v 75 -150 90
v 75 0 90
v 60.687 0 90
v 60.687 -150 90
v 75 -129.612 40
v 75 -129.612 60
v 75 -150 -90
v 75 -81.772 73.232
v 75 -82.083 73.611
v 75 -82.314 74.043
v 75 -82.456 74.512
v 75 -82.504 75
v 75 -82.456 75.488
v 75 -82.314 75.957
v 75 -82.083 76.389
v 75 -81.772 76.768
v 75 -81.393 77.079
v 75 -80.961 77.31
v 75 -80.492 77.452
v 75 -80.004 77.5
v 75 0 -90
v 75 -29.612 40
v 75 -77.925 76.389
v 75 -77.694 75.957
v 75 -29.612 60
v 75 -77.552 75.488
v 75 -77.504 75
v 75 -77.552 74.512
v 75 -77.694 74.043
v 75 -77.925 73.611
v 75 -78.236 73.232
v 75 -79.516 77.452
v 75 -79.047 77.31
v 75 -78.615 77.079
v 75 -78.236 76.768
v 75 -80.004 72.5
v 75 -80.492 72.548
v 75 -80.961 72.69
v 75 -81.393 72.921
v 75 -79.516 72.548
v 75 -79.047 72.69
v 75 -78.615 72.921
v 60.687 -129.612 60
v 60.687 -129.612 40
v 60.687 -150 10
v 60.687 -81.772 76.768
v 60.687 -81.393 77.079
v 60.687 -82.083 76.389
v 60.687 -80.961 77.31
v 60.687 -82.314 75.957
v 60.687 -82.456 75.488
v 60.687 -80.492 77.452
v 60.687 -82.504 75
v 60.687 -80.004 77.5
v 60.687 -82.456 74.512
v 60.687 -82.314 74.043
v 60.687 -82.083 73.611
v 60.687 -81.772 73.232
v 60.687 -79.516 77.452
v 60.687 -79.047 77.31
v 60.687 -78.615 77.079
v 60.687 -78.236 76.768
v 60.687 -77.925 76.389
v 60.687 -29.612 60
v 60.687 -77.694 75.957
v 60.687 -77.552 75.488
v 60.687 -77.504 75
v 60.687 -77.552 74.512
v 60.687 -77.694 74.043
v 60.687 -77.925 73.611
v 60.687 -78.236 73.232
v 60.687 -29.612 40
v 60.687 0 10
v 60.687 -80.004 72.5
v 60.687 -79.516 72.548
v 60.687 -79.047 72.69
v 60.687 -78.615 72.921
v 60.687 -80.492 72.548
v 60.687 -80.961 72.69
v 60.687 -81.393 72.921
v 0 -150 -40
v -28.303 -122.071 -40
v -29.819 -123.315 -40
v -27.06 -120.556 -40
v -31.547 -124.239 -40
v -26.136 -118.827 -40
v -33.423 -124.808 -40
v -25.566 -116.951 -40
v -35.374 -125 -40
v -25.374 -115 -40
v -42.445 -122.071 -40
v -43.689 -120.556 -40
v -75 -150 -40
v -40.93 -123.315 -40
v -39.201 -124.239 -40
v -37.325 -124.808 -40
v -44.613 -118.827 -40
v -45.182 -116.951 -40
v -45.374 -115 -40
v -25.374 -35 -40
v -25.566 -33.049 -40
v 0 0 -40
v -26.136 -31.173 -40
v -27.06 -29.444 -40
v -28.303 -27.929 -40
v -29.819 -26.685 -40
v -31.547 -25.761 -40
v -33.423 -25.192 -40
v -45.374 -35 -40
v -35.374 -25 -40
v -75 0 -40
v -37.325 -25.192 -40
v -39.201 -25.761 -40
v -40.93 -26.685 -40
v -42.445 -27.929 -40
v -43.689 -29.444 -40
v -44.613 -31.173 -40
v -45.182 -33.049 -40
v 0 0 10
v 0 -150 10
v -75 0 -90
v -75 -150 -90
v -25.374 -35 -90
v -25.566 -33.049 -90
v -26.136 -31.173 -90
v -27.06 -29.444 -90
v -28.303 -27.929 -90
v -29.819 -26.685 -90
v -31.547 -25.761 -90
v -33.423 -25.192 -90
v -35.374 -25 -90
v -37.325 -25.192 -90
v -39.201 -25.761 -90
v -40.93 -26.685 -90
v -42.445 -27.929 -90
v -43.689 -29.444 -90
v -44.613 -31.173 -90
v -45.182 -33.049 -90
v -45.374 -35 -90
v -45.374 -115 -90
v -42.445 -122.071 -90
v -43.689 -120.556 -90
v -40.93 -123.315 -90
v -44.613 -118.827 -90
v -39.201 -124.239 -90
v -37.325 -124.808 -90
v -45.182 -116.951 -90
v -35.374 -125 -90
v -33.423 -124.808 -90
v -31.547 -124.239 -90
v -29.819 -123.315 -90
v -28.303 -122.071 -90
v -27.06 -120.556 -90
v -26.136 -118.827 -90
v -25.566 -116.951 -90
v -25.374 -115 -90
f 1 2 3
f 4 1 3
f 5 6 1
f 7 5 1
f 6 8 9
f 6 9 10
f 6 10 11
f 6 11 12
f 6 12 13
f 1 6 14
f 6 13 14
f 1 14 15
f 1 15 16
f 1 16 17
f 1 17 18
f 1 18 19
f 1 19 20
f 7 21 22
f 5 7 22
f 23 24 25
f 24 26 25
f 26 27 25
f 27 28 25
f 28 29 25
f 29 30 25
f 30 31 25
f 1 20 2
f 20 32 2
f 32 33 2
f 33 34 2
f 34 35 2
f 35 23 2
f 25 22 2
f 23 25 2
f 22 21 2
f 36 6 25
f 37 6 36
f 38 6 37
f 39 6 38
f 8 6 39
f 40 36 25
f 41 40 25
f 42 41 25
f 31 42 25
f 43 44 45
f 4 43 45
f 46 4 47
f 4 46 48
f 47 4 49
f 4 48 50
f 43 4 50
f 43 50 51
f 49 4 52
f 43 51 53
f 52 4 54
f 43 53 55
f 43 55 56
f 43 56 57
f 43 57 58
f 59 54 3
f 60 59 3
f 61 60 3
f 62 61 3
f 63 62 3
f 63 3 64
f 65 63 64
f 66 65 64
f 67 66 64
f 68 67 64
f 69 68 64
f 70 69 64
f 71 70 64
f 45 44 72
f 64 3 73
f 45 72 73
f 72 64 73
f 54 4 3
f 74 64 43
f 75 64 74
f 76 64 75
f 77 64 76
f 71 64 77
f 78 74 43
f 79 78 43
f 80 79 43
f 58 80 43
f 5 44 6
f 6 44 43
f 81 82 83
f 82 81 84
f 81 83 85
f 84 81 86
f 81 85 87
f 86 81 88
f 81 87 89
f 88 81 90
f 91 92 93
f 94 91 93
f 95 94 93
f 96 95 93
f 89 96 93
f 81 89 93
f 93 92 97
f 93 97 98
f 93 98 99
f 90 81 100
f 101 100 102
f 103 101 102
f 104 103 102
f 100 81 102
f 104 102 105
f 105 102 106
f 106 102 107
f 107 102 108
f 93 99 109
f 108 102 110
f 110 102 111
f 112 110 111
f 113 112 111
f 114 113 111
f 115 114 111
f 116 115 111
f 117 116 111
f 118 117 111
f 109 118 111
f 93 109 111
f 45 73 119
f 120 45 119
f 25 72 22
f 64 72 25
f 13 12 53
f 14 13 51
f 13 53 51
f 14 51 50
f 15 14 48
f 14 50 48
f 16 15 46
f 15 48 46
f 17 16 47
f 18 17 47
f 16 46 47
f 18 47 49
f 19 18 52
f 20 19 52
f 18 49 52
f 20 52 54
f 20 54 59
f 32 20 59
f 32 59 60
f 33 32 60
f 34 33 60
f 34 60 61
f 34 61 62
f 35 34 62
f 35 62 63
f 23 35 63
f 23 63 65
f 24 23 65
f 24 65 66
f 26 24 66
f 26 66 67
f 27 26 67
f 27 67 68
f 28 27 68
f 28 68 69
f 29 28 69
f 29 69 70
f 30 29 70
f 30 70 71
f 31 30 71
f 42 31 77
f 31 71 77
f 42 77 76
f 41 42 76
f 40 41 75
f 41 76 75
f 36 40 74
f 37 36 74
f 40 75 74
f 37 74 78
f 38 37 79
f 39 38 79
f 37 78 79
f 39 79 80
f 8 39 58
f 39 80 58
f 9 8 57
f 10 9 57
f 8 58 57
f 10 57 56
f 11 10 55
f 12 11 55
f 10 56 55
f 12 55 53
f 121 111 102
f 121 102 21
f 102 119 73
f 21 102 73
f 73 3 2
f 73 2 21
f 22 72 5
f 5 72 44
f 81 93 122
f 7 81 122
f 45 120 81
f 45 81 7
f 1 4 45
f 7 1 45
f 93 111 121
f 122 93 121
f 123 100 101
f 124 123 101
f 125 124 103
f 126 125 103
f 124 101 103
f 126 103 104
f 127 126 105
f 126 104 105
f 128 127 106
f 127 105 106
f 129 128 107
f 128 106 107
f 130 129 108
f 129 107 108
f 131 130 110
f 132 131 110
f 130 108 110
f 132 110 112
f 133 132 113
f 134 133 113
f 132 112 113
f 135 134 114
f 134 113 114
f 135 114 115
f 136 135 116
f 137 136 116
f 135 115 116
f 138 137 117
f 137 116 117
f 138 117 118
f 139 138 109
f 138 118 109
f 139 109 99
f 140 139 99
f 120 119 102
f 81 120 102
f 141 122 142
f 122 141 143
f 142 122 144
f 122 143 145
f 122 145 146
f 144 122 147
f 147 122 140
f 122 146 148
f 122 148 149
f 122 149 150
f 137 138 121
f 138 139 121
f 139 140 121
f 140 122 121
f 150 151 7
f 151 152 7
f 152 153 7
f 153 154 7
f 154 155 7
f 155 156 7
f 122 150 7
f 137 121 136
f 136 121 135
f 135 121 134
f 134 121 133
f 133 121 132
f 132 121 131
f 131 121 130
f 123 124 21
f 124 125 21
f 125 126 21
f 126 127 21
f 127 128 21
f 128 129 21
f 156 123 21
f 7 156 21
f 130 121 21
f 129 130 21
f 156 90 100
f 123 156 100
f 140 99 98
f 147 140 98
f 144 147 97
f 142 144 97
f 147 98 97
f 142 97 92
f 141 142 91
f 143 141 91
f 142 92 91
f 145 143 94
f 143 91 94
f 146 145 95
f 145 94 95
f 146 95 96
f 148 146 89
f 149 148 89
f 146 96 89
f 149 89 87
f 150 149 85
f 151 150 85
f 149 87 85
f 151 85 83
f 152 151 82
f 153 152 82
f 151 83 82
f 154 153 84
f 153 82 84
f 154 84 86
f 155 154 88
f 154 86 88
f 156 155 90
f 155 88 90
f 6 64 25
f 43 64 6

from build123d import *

# Parameters (mm, degrees)
F1_DEPTH = 150
F3_DEPTH = 50.001
F4_W     = 100
F4_H     = 20
F4_R     = 2.5
F5_DEPTH = 14.313931


with BuildPart() as f1:
    # F0 (on Front) → F1 (new body)
    with BuildSketch(Plane.XZ):
        Polygon((-75, -90), (75, -90), (75, 90), (60.687069, 90), (60.687069, 10), (0, 10), (0, -40), (-75, -40), align=None)
    extrude(amount=F1_DEPTH)

    # F2 (on face) → F3 (cut, through all)
    with BuildSketch(Plane.XY.offset(-40)):
        with BuildLine():
            ThreePointArc((-45.374333, -35), (-35.374333, -45), (-25.374333, -35))
            ThreePointArc((-25.374333, -35), (-35.374333, -25), (-45.374333, -35))
        make_face()
        with BuildLine():
            Line((-25.374333, -115), (-25.374333, -35))
            ThreePointArc((-25.374333, -35), (-35.374333, -45), (-45.374333, -35))
            Line((-45.374333, -35), (-45.374333, -115))
            ThreePointArc((-45.374333, -115), (-35.374333, -105), (-25.374333, -115))
        make_face()
        with BuildLine():
            ThreePointArc((-45.374333, -115), (-35.374333, -125), (-25.374333, -115))
            ThreePointArc((-25.374333, -115), (-35.374333, -105), (-45.374333, -115))
        make_face()
    extrude(amount=-F3_DEPTH, mode=Mode.SUBTRACT)

    # F4 (on face) → F5 (cut, through all)
    with BuildSketch(Plane(origin=(60.687069, 0, 0), x_dir=(0, -1, 0), z_dir=(-1, 0, 0))):
        with Locations((79.612304, 50)):
            Rectangle(F4_W, F4_H)
        with Locations((80.003977, 75)):
            Circle(F4_R)
    extrude(amount=-F5_DEPTH, mode=Mode.SUBTRACT)


solid = f1.part
